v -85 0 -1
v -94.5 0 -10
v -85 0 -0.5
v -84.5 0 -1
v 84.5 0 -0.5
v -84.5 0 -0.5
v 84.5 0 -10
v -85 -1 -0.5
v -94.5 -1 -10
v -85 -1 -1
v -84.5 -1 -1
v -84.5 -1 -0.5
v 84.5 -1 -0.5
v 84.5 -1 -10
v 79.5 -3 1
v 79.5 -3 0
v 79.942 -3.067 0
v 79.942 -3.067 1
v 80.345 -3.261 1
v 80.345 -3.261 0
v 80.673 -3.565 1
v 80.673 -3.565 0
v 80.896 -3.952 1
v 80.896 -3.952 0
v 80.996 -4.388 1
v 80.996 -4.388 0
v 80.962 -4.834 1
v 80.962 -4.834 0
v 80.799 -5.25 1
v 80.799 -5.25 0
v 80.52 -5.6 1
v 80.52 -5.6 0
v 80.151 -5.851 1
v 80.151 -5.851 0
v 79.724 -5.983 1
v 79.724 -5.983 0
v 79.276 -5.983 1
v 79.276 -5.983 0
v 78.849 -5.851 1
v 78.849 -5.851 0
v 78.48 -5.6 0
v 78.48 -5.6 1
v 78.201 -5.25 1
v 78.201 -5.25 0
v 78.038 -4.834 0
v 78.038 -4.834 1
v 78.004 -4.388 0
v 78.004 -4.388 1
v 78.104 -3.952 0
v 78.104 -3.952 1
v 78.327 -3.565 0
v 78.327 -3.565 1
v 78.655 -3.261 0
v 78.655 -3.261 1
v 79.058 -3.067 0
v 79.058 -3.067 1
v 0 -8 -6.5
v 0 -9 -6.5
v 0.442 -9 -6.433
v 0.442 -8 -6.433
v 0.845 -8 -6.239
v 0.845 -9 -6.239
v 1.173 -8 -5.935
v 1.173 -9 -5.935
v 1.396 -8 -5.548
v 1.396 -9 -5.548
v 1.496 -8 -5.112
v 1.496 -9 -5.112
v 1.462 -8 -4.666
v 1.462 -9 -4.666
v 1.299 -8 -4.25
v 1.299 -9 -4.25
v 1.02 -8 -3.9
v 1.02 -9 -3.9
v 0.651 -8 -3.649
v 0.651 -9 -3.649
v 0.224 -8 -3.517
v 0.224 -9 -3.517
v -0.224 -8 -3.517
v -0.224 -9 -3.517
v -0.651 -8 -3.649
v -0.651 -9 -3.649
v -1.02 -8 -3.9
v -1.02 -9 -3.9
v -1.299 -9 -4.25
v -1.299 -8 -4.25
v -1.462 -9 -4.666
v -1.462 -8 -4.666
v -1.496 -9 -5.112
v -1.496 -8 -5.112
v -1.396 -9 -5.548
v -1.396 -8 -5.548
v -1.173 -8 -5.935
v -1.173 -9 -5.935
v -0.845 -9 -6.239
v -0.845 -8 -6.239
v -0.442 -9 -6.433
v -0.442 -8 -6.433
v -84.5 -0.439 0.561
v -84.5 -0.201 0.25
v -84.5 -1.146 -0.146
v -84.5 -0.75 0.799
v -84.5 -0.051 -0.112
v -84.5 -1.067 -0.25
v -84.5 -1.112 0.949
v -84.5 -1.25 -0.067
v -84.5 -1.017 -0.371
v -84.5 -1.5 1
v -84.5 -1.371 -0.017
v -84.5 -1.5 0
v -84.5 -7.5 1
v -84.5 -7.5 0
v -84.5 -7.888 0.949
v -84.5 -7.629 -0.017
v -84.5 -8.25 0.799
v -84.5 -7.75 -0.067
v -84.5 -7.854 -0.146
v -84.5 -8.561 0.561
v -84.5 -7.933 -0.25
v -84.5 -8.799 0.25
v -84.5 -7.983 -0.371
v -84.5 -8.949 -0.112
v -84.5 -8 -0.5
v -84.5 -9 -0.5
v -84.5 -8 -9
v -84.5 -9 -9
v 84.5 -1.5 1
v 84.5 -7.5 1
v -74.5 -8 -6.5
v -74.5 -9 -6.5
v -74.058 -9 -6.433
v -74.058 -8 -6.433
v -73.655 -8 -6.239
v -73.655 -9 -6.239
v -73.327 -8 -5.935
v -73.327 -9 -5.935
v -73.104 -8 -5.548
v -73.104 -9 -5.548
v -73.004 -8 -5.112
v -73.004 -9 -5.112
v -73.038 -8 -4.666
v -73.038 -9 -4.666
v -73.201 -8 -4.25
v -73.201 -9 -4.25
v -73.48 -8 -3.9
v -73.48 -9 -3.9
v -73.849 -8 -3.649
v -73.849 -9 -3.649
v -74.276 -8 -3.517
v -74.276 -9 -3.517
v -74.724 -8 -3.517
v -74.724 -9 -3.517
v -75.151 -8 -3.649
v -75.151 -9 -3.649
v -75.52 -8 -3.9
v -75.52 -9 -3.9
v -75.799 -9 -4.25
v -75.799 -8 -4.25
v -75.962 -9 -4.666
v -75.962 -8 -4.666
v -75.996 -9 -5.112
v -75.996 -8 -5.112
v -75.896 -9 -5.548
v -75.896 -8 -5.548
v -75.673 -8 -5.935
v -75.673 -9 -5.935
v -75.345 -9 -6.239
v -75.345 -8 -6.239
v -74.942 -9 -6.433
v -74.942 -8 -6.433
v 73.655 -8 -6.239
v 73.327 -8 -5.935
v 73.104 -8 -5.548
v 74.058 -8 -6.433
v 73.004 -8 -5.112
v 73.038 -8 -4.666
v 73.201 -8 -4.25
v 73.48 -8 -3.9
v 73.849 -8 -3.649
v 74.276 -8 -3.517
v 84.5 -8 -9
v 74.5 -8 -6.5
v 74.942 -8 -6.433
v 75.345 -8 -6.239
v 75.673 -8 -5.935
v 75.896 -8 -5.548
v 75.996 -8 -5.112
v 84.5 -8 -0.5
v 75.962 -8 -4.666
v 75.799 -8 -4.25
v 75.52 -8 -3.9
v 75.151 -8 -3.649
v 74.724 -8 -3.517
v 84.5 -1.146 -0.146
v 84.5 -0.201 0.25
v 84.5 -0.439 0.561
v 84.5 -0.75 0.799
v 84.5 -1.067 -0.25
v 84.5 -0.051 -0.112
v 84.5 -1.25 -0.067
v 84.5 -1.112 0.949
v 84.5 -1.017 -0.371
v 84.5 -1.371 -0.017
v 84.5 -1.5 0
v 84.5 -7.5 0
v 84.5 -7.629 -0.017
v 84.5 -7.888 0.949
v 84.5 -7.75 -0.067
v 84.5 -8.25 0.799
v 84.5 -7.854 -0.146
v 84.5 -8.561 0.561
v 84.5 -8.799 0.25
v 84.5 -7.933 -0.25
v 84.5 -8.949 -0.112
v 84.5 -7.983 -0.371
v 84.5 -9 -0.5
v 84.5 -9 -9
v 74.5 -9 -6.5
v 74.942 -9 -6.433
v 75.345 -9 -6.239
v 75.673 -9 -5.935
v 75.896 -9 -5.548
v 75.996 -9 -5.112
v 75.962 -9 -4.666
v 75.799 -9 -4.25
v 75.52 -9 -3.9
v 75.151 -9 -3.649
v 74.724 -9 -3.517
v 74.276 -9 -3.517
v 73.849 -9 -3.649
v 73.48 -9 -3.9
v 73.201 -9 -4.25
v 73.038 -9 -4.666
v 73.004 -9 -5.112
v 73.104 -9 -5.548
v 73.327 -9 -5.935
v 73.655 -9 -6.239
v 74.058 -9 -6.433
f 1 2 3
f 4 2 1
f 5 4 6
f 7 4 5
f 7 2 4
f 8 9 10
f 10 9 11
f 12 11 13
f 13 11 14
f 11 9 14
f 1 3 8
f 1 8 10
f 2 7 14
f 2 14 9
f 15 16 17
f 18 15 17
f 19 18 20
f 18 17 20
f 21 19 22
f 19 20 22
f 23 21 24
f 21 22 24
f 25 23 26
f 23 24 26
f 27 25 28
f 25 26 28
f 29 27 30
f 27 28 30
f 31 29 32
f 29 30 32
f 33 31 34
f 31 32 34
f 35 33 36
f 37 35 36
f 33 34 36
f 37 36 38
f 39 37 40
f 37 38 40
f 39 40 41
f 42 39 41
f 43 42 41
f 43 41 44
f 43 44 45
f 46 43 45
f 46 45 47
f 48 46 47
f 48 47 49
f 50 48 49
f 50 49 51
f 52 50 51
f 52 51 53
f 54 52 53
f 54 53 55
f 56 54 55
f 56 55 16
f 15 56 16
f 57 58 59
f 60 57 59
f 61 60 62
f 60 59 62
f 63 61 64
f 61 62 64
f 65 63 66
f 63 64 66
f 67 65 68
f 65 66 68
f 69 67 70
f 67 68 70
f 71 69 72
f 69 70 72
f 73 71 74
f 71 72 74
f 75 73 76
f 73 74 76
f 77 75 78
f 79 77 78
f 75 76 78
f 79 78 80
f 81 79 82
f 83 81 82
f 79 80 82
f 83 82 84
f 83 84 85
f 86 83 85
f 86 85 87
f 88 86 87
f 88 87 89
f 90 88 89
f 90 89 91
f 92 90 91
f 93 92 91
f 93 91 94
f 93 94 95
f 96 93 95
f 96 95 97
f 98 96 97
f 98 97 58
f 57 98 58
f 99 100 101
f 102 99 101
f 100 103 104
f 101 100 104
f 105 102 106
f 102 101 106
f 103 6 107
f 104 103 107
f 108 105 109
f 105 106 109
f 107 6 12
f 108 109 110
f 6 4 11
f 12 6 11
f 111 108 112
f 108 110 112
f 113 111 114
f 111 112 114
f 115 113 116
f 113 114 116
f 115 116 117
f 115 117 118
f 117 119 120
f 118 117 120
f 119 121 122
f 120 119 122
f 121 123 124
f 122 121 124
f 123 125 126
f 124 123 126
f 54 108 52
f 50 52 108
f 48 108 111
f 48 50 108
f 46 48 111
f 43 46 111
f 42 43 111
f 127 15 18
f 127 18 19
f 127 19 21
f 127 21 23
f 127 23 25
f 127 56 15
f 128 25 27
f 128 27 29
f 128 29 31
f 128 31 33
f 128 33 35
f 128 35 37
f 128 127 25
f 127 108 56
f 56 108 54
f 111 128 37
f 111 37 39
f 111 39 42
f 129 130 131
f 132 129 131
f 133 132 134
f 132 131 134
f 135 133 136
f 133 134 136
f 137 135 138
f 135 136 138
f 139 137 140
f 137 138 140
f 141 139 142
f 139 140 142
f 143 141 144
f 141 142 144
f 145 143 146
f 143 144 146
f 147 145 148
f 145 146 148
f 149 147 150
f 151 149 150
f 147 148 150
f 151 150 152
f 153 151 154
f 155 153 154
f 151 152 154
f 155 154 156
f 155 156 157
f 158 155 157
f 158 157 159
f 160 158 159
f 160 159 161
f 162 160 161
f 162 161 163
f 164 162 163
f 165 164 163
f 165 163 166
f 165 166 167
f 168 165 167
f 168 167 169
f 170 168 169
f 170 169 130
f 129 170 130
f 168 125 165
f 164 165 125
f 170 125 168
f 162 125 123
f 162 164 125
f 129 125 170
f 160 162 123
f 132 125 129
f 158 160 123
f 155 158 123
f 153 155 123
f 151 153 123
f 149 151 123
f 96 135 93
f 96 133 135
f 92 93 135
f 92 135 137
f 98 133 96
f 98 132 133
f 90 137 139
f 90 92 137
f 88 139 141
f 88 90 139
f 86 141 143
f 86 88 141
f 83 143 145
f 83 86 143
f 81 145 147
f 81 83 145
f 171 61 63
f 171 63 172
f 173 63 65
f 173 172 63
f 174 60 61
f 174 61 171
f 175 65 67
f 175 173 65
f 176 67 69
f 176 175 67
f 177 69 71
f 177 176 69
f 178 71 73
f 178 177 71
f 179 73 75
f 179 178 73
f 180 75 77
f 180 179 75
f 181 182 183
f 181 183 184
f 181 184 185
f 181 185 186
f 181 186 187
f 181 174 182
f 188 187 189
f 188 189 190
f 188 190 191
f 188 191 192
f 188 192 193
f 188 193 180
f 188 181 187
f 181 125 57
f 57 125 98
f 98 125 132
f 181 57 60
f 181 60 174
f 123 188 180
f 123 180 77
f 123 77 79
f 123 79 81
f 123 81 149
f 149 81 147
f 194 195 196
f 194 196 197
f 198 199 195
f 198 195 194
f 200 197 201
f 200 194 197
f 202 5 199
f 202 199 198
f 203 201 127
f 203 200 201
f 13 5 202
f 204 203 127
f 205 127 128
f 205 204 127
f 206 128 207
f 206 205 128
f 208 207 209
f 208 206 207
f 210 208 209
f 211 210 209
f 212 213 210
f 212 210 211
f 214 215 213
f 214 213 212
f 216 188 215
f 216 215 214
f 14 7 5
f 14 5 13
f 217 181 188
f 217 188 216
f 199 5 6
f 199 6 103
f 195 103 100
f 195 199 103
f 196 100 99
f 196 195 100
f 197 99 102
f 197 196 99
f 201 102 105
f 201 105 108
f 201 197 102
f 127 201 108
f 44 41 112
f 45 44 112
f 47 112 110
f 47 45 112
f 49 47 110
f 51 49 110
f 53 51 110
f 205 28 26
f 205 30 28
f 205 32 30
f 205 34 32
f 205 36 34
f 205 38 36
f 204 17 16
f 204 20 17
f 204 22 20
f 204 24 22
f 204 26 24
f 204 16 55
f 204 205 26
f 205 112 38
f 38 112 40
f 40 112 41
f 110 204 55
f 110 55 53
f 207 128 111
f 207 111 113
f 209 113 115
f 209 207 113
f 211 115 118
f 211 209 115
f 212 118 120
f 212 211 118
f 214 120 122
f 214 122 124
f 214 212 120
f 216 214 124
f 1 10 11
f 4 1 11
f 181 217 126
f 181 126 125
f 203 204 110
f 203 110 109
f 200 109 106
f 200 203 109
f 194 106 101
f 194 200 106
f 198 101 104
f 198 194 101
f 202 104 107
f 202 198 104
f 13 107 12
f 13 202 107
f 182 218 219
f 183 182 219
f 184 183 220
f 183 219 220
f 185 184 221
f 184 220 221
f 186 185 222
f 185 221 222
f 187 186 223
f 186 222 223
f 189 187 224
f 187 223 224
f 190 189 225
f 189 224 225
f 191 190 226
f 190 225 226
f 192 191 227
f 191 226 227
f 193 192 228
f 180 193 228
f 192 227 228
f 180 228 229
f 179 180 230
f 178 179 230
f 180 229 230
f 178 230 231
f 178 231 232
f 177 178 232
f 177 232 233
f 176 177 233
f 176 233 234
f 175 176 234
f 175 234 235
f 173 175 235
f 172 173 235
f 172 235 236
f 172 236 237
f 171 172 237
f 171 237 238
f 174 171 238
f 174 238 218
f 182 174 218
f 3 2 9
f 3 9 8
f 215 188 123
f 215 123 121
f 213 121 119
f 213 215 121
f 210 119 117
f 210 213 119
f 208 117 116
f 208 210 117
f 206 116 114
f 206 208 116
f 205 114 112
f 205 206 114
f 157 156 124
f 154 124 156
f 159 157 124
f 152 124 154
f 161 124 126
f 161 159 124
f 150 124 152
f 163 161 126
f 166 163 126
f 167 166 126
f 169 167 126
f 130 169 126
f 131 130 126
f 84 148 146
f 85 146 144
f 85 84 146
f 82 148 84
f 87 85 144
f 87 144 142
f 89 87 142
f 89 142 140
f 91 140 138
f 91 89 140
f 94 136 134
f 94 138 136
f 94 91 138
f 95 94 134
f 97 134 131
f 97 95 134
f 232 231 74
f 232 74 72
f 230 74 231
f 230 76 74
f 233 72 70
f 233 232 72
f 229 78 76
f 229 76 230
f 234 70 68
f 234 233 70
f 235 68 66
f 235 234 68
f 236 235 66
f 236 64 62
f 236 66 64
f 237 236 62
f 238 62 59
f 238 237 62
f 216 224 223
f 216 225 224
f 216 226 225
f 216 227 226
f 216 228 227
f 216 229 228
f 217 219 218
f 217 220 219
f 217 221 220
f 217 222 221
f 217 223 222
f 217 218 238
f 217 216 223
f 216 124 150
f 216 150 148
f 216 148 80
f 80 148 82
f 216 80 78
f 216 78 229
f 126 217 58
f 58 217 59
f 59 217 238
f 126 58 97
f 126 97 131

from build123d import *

# Parameters (mm, degrees)
BASE_FLANGE1_DEPTH            = 1
EDGE_FLANGE1_STRIP_W          = 5
EDGE_FLANGE1_STRIP_H          = 1
EDGE_FLANGE1_STRIP_CUT_DEPTH  = 169
EDGE_FLANGE1_RELIEF_W         = 5.5
EDGE_FLANGE1_RELIEF_H         = 0.5
EDGE_FLANGE1_RELIEF_CUT_DEPTH = 1
EDGE_FLANGE1_DEPTH            = 169
EDGE_FLANGE2_STRIP_W          = 5
EDGE_FLANGE2_STRIP_H          = 1
EDGE_FLANGE2_STRIP_CUT_DEPTH  = 169
EDGE_FLANGE2_DEPTH            = 169
SKETCH12_R                    = 1.5
CUT_EXTRUDE1_DEPTH            = 3
SKETCH13_R                    = 1.5
CUT_EXTRUDE2_DEPTH            = 3


# Sheet-metal steps are written as plain solids
with BuildPart() as part:
    # Sketch1 → Base-Flange1 (new body)
    with BuildSketch(Plane(origin=(0, 0, 0), x_dir=(1, 0, 0), z_dir=(0, 1, 0))):
        Polygon((-84.5, 0), (84.5, 0), (84.5, 10), (-94.5, 10), align=None)
    extrude(amount=-BASE_FLANGE1_DEPTH)

    # Edge-Flange1 strip (across the edge) → Edge-Flange1 strip cut (cut)
    with BuildSketch(Plane(origin=(84.5, -1, 0), x_dir=(0, 0, -1), z_dir=(-1, 0, 0))):
        with Locations((-2, -0.5)):
            Rectangle(EDGE_FLANGE1_STRIP_W, EDGE_FLANGE1_STRIP_H)
    extrude(amount=EDGE_FLANGE1_STRIP_CUT_DEPTH, mode=Mode.SUBTRACT)

    # Edge-Flange1 relief (on the sheet) → Edge-Flange1 relief cut (cut)
    with BuildSketch(Plane(origin=(84.5, -1, -0.5), x_dir=(0, 0, -1), z_dir=(0, -1, 0))):
        with Locations((-2.25, -169.25)):
            Rectangle(EDGE_FLANGE1_RELIEF_W, EDGE_FLANGE1_RELIEF_H)
    extrude(amount=-EDGE_FLANGE1_RELIEF_CUT_DEPTH, mode=Mode.SUBTRACT)

    # Edge-Flange1 section (across the edge) → Edge-Flange1 (add)
    with BuildSketch(Plane(origin=(84.5, -1, 0), x_dir=(0, 0, -1), z_dir=(-1, 0, 0))):
        with BuildLine():
            Line((-1, 0.5), (-1, 7))
            Line((-1, 7), (0, 7))
            Line((0, 7), (0, 0.5))
            ThreePointArc((0, 0.5), (0.146446609, 0.146446609), (0.5, 0))
            Line((0.5, 0), (0.5, -1))
            ThreePointArc((0.5, -1), (-0.560660172, -0.560660172), (-1, 0.5))
        make_face()
    extrude(amount=EDGE_FLANGE1_DEPTH)

    # Edge-Flange2 strip (across the edge) → Edge-Flange2 strip cut (cut)
    with BuildSketch(Plane(origin=(84.5, -8, 0), x_dir=(0, 1, 0), z_dir=(-1, 0, 0))):
        with Locations((-2, -0.5)):
            Rectangle(EDGE_FLANGE2_STRIP_W, EDGE_FLANGE2_STRIP_H)
    extrude(amount=EDGE_FLANGE2_STRIP_CUT_DEPTH, mode=Mode.SUBTRACT)

    # Edge-Flange2 section (across the edge) → Edge-Flange2 (add)
    with BuildSketch(Plane(origin=(84.5, -8, 0), x_dir=(0, 1, 0), z_dir=(-1, 0, 0))):
        with BuildLine():
            Line((-1, 0.5), (-1, 9))
            Line((-1, 9), (0, 9))
            Line((0, 9), (0, 0.5))
            ThreePointArc((0, 0.5), (0.146446609, 0.146446609), (0.5, 0))
            Line((0.5, 0), (0.5, -1))
            ThreePointArc((0.5, -1), (-0.560660172, -0.560660172), (-1, 0.5))
        make_face()
    extrude(amount=EDGE_FLANGE2_DEPTH)

    # Sketch12 → Cut-Extrude1 (cut)
    with BuildSketch(Plane.XZ.offset(9)):
        with Locations(Location((-74.5, -5, 0), (0, 0, 270))):
            Circle(SKETCH12_R)
        with Locations(Location((0, -5, 0), (0, 0, 270))):
            Circle(SKETCH12_R)
        with Locations(Location((74.5, -5, 0), (0, 0, 270))):
            Circle(SKETCH12_R)
    extrude(amount=-CUT_EXTRUDE1_DEPTH, mode=Mode.SUBTRACT)

    # Sketch13 → Cut-Extrude2 (cut)
    with BuildSketch(Plane(origin=(0, 0, 0), x_dir=(-1, 0, 0), z_dir=(0, 0, -1))):
        with Locations(Location((-79.5, -4.5, 0), (0, 0, 90))):
            Circle(SKETCH13_R)
    extrude(amount=-CUT_EXTRUDE2_DEPTH, mode=Mode.SUBTRACT)


solid = part.part
